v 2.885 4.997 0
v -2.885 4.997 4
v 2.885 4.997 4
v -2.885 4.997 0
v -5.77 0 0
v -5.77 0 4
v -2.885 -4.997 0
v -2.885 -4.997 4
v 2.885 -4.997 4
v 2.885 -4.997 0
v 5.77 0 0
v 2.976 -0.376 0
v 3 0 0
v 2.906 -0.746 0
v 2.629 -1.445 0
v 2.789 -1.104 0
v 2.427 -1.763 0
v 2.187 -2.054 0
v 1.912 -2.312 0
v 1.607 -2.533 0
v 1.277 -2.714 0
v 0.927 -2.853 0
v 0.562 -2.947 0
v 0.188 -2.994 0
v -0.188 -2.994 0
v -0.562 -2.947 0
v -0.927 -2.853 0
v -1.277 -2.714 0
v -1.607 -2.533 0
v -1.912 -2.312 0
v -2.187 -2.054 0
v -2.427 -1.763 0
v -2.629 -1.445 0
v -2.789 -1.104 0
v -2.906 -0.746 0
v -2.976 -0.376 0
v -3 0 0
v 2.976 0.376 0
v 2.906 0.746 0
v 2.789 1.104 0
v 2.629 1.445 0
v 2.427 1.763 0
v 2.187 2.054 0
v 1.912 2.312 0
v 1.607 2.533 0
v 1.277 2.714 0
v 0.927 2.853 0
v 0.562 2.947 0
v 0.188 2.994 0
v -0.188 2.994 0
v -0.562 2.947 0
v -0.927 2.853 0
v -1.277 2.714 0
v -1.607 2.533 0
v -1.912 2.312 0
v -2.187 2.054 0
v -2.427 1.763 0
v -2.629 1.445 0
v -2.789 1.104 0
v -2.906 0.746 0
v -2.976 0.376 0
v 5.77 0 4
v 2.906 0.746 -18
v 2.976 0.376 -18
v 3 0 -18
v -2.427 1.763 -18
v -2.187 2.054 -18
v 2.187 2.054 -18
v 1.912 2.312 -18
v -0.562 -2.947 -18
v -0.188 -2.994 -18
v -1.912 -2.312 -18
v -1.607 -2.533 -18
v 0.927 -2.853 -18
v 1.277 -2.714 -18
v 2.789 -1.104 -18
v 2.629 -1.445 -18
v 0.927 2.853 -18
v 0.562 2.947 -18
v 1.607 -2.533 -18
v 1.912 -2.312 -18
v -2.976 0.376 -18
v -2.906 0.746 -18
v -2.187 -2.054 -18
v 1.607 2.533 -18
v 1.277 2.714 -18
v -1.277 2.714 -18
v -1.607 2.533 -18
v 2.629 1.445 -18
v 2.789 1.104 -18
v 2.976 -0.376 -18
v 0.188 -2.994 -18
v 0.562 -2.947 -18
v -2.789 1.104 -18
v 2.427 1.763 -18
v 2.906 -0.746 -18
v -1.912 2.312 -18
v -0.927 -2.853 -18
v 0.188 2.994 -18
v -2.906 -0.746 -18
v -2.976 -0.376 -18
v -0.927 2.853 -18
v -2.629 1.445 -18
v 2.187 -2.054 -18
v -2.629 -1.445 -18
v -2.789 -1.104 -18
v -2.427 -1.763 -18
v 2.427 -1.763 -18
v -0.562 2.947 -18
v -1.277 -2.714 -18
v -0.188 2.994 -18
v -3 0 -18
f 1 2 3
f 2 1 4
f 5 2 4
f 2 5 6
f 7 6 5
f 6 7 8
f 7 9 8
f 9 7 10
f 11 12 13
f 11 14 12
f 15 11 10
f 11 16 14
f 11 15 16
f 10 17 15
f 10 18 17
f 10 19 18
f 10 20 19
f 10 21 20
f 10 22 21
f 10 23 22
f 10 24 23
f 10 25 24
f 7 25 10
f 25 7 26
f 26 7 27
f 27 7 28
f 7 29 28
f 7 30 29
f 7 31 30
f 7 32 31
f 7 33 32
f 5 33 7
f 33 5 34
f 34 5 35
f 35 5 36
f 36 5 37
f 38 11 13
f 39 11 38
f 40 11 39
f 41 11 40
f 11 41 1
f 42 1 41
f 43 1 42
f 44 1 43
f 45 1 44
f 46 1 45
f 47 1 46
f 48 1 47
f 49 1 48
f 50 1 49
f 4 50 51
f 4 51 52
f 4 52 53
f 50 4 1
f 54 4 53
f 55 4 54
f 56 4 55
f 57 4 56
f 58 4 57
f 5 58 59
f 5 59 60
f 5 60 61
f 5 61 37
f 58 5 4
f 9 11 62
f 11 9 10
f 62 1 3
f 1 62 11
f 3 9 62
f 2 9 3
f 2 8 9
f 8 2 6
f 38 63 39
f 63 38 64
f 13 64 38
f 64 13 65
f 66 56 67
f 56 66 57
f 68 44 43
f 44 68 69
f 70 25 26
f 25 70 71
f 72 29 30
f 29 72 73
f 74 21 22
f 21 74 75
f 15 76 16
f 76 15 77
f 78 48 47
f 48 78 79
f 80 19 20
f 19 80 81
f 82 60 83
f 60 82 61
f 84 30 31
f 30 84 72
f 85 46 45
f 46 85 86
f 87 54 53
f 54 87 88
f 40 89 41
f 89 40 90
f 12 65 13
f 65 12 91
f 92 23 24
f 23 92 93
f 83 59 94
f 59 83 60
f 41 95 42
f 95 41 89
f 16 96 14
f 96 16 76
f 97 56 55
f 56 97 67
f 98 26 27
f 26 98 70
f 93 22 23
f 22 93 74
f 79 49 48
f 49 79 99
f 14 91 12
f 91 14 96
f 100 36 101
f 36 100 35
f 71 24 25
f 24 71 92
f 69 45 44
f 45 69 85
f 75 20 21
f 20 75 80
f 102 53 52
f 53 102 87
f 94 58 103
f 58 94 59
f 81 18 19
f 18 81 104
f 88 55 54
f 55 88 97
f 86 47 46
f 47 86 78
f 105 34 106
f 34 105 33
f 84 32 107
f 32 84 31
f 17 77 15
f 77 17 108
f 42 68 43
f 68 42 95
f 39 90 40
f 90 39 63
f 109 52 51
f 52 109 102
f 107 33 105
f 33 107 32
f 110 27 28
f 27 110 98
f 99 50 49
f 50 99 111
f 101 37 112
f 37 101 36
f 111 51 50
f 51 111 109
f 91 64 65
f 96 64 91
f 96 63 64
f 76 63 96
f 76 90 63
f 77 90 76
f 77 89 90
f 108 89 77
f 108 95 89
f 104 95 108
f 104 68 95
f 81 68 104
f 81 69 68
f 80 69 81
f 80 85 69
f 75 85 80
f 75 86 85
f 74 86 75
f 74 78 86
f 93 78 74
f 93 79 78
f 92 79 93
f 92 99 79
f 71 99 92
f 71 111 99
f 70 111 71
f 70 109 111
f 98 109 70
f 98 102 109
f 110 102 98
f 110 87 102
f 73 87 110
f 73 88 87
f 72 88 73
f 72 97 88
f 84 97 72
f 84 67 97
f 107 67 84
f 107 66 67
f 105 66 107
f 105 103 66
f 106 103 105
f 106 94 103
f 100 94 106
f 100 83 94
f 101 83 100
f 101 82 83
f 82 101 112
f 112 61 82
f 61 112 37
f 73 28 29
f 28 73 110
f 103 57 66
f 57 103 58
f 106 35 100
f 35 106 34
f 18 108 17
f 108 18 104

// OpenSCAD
$fn = 50;


difference() {
	union() {
		translate(v = [0, 0, 0]) {
			rotate(a = [0, 0, 0]) {
				translate(v = [0, 0, 0]) {
					rotate(a = [0, 0, 0]) {
						linear_extrude(height = 4) {
							polygon(points = [[5.7700000000, 0.0000000000], [2.8850000000, 4.9969665798], [-2.8850000000, 4.9969665798], [-5.7700000000, 0.0000000000], [-2.8850000000, -4.9969665798], [2.8850000000, -4.9969665798]]);
						}
					}
				}
			}
		}
		translate(v = [0, 0, -18]) {
			rotate(a = [0, 0, 0]) {
				cylinder(h = 18, r = 3.0000000000);
			}
		}
	}
	union();
}
